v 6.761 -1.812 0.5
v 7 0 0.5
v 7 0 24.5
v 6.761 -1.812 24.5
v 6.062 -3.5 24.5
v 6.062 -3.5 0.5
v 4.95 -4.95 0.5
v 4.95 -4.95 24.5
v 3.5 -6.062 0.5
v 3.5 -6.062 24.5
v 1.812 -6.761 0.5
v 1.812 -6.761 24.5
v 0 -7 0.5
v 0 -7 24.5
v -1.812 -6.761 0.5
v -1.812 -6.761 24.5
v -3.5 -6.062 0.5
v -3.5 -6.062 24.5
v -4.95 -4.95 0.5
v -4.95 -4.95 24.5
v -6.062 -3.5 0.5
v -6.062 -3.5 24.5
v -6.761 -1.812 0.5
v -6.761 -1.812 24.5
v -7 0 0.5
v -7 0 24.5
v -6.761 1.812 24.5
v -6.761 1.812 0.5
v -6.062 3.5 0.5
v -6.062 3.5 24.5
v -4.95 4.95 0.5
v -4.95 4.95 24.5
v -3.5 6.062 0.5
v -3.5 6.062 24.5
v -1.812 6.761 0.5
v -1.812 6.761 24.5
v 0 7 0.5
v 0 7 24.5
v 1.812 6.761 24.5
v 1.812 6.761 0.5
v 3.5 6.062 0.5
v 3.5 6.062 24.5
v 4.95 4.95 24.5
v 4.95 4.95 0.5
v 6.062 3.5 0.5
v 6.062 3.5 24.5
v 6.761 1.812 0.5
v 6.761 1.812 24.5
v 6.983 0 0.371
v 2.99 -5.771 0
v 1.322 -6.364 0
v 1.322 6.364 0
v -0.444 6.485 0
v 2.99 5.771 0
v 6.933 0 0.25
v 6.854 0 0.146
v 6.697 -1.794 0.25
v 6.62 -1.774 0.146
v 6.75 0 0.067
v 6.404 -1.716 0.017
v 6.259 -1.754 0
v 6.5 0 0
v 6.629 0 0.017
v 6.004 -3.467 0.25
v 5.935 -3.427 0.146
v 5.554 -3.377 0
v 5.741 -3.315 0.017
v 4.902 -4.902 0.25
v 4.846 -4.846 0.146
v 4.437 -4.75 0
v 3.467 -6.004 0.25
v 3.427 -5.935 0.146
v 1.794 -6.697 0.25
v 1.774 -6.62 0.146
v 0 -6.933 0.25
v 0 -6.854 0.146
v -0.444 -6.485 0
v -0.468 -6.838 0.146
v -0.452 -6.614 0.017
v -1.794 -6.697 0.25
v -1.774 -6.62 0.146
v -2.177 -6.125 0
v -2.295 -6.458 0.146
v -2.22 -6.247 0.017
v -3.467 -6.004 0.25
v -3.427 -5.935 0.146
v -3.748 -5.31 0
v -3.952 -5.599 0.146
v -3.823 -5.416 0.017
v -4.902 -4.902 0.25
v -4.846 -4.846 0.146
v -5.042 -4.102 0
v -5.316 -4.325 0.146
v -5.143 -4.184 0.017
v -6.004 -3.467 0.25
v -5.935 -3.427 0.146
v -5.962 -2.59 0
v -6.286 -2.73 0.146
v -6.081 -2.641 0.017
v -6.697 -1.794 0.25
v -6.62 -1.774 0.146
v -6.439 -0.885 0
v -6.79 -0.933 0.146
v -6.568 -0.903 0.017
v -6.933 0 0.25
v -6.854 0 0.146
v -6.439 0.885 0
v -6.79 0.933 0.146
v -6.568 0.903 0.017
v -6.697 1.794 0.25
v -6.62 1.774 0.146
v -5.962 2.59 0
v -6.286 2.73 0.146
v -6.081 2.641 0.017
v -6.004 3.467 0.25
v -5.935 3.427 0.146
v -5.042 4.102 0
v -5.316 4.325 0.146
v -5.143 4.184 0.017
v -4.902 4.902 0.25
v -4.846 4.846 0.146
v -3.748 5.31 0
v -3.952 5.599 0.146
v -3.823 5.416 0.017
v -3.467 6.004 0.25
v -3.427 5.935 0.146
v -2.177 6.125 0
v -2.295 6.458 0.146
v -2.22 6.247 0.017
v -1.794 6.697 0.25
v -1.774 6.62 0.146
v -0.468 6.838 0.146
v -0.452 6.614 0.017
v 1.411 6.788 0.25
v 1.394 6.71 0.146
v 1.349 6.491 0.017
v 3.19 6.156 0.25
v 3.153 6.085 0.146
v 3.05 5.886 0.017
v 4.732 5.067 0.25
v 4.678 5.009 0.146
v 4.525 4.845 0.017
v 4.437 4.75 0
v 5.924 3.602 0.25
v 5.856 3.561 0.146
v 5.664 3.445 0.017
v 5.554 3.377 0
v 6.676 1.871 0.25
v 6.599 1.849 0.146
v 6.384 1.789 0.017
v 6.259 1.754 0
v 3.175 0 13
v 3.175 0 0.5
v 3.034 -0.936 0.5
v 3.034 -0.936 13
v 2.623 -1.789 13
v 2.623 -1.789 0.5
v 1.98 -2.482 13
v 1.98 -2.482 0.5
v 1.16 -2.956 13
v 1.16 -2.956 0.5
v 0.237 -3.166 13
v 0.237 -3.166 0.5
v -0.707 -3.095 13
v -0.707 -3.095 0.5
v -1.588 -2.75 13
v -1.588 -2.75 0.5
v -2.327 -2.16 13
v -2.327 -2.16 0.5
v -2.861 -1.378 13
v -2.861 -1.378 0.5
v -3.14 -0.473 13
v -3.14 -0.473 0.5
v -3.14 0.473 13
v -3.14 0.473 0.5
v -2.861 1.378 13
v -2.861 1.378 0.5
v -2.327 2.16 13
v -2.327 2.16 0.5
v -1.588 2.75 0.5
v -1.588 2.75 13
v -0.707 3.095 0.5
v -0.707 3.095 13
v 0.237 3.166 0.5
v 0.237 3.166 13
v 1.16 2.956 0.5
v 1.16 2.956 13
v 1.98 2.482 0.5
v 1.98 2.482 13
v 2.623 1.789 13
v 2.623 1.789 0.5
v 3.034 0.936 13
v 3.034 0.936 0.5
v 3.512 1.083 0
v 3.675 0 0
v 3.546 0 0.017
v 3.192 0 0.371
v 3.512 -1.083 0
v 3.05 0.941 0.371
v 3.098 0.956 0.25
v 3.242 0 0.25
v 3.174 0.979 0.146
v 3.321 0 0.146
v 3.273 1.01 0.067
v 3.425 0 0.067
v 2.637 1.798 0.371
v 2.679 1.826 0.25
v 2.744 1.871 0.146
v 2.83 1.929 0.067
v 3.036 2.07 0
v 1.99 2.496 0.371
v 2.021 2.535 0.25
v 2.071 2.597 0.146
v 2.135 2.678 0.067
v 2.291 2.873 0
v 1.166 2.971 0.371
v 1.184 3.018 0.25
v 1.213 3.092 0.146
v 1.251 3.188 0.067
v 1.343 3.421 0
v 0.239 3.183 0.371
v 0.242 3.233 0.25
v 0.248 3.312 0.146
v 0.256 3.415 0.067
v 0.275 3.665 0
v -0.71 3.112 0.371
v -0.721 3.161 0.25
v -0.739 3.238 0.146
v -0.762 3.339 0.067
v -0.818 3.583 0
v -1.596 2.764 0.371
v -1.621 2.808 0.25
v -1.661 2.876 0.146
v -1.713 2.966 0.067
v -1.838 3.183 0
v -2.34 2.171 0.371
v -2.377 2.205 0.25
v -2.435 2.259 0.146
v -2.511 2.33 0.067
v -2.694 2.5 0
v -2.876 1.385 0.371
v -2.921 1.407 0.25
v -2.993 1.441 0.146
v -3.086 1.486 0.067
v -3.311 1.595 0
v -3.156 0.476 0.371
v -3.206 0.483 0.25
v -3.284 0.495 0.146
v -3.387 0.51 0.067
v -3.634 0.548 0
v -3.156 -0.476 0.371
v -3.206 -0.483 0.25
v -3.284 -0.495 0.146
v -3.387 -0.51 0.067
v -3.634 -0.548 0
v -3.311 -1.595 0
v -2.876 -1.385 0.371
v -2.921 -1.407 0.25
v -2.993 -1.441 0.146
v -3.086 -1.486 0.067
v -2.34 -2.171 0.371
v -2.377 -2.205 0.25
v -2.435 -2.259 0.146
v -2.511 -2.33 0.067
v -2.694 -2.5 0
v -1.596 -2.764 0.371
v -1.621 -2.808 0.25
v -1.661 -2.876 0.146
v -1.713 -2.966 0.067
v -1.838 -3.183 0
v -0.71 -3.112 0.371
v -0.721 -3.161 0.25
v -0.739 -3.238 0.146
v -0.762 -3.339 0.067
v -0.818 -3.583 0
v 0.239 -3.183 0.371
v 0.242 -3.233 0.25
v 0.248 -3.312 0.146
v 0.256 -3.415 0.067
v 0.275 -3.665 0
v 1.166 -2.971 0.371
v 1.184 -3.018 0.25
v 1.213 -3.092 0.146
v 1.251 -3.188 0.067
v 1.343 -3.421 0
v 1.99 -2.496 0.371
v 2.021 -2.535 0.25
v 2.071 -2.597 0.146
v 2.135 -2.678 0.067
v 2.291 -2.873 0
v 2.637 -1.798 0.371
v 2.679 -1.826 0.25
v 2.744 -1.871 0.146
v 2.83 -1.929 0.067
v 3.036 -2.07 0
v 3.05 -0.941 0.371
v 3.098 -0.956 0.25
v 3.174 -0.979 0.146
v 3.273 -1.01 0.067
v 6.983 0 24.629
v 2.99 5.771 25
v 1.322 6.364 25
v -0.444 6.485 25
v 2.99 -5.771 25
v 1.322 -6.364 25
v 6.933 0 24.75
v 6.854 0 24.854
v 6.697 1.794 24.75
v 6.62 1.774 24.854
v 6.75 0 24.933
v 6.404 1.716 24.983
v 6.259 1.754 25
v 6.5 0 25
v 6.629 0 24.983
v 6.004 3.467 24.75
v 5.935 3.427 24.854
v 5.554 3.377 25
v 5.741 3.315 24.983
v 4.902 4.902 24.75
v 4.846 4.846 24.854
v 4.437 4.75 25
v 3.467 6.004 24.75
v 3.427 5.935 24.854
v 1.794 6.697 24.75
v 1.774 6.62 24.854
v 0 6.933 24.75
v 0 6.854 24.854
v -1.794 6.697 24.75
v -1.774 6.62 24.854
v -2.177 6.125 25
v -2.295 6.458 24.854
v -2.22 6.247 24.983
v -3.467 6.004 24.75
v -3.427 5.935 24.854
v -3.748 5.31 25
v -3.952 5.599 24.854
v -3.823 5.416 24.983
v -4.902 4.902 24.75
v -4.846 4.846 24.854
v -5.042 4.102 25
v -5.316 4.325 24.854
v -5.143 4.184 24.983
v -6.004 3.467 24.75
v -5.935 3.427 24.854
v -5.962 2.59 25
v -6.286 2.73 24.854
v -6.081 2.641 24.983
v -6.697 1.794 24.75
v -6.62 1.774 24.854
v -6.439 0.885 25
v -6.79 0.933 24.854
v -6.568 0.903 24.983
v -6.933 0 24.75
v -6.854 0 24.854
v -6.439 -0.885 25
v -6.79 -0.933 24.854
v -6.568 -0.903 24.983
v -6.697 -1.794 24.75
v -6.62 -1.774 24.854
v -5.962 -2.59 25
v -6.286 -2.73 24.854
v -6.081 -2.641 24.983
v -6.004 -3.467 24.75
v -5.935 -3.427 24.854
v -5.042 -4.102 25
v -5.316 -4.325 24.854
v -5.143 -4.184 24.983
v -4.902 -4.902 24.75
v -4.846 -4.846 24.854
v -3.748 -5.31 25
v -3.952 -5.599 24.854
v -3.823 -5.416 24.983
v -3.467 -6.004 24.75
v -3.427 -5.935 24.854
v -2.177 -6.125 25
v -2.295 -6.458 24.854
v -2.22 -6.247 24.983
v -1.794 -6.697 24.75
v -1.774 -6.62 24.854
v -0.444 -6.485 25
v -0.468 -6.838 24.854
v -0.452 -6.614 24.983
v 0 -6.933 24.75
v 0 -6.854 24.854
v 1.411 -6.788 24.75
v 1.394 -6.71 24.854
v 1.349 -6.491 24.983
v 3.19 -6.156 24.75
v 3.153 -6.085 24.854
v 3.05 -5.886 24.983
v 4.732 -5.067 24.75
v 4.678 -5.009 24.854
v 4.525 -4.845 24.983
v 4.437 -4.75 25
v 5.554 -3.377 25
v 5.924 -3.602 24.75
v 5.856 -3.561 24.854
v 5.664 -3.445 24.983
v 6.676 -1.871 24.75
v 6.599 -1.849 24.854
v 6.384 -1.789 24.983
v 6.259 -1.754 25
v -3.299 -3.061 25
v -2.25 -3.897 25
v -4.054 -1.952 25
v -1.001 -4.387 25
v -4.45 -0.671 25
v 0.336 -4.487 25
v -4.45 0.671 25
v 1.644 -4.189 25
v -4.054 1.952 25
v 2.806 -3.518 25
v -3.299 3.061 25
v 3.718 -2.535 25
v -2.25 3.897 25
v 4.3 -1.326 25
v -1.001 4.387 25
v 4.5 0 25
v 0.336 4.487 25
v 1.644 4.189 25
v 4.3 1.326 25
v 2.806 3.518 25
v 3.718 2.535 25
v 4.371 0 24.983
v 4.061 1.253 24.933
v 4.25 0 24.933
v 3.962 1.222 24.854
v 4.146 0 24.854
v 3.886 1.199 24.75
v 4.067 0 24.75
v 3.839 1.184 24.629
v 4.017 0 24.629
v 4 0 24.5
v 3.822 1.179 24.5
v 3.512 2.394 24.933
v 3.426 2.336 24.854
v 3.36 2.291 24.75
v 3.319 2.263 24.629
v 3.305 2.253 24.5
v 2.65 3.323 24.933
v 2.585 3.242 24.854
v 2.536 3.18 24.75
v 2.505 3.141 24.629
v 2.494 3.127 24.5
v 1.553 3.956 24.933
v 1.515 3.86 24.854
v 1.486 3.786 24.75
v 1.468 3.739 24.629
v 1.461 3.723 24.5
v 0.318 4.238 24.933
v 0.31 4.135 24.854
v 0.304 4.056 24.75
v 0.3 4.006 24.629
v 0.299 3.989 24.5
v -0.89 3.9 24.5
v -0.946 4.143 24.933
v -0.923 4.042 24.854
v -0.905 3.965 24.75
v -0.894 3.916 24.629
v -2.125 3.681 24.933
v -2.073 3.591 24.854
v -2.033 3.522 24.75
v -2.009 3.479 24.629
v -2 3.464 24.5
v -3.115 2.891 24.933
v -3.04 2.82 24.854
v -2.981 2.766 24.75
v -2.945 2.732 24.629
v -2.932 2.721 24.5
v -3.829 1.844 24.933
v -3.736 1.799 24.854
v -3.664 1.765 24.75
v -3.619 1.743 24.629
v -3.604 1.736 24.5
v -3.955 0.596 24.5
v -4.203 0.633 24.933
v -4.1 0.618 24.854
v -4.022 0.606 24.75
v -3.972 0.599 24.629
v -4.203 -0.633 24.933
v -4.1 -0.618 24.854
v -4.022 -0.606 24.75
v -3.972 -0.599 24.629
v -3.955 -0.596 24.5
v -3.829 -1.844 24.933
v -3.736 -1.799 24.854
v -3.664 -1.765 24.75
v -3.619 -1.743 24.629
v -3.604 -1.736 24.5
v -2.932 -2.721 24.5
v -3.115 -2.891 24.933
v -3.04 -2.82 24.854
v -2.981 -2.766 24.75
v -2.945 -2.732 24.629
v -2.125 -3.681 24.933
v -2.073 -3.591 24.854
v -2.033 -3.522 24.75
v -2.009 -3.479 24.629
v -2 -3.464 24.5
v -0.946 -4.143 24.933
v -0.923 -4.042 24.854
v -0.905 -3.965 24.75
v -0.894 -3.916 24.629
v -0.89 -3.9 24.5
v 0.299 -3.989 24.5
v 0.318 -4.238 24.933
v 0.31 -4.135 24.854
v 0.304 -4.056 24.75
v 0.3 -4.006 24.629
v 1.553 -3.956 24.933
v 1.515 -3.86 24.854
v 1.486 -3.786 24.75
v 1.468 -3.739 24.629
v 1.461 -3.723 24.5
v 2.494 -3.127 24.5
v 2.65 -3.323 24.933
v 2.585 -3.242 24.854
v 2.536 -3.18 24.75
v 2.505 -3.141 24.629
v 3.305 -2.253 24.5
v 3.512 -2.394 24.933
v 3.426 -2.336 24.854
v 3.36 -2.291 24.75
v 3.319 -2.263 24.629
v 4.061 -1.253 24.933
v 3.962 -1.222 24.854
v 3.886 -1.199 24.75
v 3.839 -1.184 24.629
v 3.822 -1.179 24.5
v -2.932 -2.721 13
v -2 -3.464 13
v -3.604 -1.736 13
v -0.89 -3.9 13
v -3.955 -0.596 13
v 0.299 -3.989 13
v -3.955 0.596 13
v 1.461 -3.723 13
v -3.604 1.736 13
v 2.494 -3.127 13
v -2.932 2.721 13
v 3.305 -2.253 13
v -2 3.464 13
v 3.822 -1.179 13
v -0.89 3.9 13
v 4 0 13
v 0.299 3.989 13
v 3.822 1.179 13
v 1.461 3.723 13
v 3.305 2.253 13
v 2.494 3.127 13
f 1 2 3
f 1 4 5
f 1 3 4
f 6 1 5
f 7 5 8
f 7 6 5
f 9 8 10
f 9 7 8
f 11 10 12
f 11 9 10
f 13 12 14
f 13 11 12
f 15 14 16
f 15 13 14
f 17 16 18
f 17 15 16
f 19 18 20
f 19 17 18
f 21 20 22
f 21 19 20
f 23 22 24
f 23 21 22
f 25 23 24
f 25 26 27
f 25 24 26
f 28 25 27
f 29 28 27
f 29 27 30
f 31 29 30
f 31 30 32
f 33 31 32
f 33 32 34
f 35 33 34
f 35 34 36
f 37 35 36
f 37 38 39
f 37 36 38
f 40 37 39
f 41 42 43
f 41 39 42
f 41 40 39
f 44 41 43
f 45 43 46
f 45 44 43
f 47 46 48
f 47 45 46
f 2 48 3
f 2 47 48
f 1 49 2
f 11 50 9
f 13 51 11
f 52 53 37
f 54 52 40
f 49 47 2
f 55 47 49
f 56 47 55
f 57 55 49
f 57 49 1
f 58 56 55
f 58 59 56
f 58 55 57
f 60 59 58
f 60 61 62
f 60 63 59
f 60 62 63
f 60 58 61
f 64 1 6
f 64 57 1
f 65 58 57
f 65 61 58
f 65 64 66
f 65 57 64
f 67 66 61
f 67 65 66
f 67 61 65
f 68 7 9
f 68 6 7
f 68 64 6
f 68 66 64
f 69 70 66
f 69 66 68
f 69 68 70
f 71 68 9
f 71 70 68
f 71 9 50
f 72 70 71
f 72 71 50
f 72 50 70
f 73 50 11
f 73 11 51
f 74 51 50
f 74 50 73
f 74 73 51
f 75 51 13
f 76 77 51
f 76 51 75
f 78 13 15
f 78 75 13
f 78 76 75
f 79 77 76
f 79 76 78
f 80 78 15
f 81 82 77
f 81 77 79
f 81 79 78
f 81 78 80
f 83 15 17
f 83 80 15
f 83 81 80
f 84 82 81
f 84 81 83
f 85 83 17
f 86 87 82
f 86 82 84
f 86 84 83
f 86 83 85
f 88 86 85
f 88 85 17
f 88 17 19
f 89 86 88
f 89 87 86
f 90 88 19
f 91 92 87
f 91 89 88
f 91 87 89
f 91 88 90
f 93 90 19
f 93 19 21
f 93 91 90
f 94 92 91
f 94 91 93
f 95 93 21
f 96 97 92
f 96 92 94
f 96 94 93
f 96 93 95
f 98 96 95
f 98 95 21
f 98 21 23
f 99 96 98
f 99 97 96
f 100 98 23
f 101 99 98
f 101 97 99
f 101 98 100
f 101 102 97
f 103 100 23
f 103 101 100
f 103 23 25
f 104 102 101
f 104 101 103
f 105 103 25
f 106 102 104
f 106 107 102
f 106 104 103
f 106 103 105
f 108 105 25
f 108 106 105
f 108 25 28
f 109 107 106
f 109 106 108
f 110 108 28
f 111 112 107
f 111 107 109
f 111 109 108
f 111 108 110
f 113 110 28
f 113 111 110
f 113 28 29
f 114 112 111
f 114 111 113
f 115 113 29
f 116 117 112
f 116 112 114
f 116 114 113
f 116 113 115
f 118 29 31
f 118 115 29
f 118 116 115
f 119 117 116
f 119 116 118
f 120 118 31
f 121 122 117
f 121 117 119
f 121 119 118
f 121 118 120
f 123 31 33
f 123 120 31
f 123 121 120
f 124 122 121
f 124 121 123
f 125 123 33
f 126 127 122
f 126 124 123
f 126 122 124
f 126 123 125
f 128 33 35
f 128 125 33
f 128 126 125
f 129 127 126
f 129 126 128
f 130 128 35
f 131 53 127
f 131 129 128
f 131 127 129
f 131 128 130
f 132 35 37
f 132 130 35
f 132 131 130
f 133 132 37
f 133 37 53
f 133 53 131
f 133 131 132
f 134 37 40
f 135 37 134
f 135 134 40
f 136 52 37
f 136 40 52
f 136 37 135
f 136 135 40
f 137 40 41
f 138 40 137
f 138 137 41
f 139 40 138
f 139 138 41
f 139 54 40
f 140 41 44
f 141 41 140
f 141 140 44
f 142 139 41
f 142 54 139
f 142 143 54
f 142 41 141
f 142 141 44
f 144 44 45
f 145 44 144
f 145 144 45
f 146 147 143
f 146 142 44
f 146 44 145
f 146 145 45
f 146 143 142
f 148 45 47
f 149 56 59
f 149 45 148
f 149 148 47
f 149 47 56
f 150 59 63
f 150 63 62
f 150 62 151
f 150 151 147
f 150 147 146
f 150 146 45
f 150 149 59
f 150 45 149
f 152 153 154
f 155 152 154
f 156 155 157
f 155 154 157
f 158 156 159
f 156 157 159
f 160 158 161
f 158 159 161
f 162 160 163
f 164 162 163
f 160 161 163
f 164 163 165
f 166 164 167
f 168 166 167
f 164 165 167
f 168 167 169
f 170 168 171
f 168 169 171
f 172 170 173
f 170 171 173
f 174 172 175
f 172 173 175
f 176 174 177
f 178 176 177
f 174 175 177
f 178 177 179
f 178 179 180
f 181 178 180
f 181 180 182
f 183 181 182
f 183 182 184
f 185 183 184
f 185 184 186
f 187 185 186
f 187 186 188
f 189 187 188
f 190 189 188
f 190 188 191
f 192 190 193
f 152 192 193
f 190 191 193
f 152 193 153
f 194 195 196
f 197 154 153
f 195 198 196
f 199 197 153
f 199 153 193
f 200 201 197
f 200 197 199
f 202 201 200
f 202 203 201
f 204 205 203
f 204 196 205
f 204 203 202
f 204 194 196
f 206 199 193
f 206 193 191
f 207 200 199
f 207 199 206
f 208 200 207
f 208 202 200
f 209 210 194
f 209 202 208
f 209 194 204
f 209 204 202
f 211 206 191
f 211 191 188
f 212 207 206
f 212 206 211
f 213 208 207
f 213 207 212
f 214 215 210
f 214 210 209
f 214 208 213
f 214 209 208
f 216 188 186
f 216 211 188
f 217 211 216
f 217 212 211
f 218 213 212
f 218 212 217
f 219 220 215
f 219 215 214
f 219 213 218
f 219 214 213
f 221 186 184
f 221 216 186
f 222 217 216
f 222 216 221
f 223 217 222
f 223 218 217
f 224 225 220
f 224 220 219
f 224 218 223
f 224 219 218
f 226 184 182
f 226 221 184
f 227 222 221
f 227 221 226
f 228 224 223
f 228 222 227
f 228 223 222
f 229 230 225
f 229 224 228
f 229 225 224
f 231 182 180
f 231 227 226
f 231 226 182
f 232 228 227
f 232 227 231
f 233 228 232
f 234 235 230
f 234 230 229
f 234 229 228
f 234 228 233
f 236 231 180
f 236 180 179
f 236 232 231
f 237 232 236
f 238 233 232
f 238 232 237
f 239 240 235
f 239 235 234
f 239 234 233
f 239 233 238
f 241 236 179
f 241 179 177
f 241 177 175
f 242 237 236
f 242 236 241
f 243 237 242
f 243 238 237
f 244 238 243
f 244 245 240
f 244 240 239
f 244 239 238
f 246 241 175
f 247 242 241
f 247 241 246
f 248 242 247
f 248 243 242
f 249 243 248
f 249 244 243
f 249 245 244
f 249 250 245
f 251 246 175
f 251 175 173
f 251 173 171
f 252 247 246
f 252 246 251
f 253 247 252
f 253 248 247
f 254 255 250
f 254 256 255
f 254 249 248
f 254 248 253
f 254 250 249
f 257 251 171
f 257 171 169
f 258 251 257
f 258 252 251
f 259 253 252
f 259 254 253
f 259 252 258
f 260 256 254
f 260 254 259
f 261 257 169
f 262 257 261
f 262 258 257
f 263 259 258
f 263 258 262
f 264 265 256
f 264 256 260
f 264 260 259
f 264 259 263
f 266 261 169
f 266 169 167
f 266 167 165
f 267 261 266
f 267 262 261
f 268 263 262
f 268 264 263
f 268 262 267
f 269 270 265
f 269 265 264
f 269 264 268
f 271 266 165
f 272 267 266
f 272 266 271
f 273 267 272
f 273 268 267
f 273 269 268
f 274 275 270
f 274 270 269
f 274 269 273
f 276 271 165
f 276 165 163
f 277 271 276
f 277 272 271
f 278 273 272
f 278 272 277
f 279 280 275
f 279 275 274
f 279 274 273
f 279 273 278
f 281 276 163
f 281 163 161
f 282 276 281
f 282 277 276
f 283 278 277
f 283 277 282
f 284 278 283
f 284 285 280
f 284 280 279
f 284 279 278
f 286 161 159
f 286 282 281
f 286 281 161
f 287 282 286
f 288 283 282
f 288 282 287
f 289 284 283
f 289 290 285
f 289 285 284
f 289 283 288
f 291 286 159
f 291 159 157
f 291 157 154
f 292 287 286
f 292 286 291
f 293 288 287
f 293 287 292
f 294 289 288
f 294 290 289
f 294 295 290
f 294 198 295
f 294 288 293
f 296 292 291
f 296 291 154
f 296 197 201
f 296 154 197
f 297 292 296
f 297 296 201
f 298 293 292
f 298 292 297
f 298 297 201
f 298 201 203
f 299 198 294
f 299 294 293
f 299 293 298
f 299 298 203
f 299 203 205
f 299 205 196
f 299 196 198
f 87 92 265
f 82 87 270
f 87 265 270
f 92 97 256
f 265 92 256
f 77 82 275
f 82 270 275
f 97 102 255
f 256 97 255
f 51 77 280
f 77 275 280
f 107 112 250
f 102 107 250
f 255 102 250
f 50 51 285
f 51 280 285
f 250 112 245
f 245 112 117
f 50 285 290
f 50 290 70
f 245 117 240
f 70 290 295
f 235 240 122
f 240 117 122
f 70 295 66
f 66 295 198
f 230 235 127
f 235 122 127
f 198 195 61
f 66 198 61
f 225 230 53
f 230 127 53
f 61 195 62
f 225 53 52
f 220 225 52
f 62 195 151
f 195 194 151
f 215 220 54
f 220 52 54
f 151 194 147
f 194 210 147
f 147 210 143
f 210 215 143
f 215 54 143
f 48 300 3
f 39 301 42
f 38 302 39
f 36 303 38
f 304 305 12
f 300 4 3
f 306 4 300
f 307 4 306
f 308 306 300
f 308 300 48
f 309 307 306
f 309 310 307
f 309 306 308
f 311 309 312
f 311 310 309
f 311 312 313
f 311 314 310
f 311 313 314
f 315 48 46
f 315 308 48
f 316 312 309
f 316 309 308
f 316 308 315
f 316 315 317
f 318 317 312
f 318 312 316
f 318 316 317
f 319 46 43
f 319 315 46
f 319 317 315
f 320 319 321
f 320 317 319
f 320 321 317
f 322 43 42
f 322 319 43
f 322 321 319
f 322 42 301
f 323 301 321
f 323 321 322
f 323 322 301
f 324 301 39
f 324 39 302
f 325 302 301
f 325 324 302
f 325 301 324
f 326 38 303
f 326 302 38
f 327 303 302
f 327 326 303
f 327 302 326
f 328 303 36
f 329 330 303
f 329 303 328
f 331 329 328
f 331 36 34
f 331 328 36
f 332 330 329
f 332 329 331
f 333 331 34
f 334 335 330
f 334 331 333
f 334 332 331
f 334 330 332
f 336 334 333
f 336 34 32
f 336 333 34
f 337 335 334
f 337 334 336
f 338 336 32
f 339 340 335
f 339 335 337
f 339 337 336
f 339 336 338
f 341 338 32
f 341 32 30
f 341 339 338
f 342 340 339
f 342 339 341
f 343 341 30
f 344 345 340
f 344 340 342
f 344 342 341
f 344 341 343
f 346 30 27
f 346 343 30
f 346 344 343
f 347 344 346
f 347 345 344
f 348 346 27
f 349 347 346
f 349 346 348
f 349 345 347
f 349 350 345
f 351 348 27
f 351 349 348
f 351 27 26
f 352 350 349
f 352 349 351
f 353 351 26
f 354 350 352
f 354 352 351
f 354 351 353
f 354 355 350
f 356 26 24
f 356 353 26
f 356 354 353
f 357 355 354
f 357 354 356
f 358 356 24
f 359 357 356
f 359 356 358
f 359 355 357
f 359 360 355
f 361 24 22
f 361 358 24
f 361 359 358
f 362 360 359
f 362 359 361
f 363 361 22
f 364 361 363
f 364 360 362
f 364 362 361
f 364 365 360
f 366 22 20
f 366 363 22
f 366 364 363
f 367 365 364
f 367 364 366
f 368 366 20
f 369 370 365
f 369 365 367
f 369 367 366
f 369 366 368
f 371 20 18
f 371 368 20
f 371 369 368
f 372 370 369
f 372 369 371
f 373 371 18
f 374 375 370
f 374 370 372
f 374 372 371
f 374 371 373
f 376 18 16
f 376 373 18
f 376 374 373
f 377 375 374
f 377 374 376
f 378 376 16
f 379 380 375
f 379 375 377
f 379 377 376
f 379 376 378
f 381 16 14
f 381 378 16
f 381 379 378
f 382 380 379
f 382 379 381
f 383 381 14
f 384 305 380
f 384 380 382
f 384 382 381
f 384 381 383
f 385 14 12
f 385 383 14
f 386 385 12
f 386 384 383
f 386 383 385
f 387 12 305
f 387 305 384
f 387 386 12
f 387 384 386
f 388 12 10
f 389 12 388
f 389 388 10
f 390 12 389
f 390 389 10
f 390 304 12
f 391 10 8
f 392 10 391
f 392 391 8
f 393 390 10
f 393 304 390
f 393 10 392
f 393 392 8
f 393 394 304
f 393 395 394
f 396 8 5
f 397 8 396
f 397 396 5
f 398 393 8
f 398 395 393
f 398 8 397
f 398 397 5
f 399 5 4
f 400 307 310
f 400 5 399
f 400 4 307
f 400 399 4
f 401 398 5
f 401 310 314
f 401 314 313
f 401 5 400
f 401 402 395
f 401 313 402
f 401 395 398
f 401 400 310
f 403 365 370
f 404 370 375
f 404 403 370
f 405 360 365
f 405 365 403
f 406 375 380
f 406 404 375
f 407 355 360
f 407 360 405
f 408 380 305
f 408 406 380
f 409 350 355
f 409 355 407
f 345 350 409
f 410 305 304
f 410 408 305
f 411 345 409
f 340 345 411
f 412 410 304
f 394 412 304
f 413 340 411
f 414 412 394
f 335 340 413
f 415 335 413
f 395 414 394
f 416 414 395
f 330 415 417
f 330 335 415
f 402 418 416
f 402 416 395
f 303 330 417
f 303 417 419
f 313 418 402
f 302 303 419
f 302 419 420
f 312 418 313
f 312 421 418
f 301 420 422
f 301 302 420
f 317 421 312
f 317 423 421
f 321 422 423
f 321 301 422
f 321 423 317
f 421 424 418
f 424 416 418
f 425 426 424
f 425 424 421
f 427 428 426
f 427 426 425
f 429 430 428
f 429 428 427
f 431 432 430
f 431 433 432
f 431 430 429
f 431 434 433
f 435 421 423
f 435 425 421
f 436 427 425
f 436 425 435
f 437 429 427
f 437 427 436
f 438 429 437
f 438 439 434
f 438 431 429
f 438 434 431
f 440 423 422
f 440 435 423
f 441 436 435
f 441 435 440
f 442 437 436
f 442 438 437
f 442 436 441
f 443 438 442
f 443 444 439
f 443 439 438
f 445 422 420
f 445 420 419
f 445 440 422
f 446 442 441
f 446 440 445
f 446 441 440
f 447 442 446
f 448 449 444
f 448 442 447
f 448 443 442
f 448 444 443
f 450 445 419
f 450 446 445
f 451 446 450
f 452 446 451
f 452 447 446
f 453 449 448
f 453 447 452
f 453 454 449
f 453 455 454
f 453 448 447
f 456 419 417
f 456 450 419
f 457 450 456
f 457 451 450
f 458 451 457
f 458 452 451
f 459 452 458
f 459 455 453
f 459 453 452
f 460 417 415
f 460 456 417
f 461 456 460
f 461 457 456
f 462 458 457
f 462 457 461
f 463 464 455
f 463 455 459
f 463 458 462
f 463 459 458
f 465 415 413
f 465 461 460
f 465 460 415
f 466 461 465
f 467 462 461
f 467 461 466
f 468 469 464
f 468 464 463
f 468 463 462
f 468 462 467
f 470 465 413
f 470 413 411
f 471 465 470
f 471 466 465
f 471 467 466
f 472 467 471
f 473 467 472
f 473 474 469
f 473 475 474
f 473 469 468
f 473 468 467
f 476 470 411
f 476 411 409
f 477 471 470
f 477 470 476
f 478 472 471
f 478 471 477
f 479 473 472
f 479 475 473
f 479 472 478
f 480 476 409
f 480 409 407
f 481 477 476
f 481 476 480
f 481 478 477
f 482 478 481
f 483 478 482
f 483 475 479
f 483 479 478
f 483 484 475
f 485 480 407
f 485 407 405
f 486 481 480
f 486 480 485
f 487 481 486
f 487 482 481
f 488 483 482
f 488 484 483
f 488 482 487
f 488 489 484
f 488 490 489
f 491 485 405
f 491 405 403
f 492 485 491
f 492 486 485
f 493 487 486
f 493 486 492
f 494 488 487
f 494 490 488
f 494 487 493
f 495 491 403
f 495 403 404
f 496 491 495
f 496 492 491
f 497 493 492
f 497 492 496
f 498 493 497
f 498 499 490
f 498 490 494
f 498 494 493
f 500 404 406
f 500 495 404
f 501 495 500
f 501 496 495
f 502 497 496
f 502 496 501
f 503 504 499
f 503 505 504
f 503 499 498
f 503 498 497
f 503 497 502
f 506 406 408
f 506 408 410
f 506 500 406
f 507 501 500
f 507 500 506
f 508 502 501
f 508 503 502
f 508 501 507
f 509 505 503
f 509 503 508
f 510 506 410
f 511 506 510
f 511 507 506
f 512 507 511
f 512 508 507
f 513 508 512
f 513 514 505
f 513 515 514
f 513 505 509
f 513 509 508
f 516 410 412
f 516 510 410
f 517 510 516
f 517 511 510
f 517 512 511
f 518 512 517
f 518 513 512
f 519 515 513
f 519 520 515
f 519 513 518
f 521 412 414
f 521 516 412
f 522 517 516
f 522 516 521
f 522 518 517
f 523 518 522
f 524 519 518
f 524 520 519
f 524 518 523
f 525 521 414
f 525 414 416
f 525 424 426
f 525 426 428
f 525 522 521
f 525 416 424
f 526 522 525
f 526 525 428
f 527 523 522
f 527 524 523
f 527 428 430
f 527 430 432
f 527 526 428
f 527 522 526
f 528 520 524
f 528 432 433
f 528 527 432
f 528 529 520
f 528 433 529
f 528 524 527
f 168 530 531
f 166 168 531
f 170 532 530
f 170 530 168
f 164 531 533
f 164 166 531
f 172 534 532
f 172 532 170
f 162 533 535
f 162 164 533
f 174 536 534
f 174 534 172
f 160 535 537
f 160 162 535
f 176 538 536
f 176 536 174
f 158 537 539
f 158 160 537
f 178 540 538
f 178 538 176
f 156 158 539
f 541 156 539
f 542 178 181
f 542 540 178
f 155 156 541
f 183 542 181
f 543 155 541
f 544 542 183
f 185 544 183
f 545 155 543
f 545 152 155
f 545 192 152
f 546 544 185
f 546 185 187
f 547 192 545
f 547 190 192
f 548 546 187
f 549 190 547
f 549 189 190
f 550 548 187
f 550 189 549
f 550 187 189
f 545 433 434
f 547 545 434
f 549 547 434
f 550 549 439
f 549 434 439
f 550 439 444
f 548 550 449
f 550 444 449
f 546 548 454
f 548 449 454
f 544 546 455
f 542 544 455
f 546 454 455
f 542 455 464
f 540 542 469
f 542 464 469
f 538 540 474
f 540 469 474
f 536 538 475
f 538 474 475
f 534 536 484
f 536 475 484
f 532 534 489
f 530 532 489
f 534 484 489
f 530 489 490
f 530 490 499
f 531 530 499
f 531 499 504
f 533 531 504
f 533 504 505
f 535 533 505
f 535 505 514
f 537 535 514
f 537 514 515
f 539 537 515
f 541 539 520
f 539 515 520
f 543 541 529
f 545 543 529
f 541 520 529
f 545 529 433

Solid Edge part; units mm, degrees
sketch "Sketch1" plane through (0, 0, 0) normal (0, 0, 1) x (1, 0, 0)
  circle A0 centre (0, 0) radius 7
  circle A1 centre (0, 0) radius 3.175
extrude "Protrusion1" add sketch "Sketch1" along normal blind 25
fillet "Round_1" radius 0.5 4 edges at (-7, 0, 25) (-7, 0, 0) (-3.175, 0, 0) (-3.175, 0, 25)
sketch "Sketch2" plane through (0, 0, 25) normal (0, 0, 1) x (1, 0, 0)
  circle A0 centre (0, 0) radius 4
extrude "ExtrudedCutout_1" cut sketch "Sketch2" against normal blind 12
fillet "Round_2" radius 0.5 1 edges at (-4, 0, 25)
